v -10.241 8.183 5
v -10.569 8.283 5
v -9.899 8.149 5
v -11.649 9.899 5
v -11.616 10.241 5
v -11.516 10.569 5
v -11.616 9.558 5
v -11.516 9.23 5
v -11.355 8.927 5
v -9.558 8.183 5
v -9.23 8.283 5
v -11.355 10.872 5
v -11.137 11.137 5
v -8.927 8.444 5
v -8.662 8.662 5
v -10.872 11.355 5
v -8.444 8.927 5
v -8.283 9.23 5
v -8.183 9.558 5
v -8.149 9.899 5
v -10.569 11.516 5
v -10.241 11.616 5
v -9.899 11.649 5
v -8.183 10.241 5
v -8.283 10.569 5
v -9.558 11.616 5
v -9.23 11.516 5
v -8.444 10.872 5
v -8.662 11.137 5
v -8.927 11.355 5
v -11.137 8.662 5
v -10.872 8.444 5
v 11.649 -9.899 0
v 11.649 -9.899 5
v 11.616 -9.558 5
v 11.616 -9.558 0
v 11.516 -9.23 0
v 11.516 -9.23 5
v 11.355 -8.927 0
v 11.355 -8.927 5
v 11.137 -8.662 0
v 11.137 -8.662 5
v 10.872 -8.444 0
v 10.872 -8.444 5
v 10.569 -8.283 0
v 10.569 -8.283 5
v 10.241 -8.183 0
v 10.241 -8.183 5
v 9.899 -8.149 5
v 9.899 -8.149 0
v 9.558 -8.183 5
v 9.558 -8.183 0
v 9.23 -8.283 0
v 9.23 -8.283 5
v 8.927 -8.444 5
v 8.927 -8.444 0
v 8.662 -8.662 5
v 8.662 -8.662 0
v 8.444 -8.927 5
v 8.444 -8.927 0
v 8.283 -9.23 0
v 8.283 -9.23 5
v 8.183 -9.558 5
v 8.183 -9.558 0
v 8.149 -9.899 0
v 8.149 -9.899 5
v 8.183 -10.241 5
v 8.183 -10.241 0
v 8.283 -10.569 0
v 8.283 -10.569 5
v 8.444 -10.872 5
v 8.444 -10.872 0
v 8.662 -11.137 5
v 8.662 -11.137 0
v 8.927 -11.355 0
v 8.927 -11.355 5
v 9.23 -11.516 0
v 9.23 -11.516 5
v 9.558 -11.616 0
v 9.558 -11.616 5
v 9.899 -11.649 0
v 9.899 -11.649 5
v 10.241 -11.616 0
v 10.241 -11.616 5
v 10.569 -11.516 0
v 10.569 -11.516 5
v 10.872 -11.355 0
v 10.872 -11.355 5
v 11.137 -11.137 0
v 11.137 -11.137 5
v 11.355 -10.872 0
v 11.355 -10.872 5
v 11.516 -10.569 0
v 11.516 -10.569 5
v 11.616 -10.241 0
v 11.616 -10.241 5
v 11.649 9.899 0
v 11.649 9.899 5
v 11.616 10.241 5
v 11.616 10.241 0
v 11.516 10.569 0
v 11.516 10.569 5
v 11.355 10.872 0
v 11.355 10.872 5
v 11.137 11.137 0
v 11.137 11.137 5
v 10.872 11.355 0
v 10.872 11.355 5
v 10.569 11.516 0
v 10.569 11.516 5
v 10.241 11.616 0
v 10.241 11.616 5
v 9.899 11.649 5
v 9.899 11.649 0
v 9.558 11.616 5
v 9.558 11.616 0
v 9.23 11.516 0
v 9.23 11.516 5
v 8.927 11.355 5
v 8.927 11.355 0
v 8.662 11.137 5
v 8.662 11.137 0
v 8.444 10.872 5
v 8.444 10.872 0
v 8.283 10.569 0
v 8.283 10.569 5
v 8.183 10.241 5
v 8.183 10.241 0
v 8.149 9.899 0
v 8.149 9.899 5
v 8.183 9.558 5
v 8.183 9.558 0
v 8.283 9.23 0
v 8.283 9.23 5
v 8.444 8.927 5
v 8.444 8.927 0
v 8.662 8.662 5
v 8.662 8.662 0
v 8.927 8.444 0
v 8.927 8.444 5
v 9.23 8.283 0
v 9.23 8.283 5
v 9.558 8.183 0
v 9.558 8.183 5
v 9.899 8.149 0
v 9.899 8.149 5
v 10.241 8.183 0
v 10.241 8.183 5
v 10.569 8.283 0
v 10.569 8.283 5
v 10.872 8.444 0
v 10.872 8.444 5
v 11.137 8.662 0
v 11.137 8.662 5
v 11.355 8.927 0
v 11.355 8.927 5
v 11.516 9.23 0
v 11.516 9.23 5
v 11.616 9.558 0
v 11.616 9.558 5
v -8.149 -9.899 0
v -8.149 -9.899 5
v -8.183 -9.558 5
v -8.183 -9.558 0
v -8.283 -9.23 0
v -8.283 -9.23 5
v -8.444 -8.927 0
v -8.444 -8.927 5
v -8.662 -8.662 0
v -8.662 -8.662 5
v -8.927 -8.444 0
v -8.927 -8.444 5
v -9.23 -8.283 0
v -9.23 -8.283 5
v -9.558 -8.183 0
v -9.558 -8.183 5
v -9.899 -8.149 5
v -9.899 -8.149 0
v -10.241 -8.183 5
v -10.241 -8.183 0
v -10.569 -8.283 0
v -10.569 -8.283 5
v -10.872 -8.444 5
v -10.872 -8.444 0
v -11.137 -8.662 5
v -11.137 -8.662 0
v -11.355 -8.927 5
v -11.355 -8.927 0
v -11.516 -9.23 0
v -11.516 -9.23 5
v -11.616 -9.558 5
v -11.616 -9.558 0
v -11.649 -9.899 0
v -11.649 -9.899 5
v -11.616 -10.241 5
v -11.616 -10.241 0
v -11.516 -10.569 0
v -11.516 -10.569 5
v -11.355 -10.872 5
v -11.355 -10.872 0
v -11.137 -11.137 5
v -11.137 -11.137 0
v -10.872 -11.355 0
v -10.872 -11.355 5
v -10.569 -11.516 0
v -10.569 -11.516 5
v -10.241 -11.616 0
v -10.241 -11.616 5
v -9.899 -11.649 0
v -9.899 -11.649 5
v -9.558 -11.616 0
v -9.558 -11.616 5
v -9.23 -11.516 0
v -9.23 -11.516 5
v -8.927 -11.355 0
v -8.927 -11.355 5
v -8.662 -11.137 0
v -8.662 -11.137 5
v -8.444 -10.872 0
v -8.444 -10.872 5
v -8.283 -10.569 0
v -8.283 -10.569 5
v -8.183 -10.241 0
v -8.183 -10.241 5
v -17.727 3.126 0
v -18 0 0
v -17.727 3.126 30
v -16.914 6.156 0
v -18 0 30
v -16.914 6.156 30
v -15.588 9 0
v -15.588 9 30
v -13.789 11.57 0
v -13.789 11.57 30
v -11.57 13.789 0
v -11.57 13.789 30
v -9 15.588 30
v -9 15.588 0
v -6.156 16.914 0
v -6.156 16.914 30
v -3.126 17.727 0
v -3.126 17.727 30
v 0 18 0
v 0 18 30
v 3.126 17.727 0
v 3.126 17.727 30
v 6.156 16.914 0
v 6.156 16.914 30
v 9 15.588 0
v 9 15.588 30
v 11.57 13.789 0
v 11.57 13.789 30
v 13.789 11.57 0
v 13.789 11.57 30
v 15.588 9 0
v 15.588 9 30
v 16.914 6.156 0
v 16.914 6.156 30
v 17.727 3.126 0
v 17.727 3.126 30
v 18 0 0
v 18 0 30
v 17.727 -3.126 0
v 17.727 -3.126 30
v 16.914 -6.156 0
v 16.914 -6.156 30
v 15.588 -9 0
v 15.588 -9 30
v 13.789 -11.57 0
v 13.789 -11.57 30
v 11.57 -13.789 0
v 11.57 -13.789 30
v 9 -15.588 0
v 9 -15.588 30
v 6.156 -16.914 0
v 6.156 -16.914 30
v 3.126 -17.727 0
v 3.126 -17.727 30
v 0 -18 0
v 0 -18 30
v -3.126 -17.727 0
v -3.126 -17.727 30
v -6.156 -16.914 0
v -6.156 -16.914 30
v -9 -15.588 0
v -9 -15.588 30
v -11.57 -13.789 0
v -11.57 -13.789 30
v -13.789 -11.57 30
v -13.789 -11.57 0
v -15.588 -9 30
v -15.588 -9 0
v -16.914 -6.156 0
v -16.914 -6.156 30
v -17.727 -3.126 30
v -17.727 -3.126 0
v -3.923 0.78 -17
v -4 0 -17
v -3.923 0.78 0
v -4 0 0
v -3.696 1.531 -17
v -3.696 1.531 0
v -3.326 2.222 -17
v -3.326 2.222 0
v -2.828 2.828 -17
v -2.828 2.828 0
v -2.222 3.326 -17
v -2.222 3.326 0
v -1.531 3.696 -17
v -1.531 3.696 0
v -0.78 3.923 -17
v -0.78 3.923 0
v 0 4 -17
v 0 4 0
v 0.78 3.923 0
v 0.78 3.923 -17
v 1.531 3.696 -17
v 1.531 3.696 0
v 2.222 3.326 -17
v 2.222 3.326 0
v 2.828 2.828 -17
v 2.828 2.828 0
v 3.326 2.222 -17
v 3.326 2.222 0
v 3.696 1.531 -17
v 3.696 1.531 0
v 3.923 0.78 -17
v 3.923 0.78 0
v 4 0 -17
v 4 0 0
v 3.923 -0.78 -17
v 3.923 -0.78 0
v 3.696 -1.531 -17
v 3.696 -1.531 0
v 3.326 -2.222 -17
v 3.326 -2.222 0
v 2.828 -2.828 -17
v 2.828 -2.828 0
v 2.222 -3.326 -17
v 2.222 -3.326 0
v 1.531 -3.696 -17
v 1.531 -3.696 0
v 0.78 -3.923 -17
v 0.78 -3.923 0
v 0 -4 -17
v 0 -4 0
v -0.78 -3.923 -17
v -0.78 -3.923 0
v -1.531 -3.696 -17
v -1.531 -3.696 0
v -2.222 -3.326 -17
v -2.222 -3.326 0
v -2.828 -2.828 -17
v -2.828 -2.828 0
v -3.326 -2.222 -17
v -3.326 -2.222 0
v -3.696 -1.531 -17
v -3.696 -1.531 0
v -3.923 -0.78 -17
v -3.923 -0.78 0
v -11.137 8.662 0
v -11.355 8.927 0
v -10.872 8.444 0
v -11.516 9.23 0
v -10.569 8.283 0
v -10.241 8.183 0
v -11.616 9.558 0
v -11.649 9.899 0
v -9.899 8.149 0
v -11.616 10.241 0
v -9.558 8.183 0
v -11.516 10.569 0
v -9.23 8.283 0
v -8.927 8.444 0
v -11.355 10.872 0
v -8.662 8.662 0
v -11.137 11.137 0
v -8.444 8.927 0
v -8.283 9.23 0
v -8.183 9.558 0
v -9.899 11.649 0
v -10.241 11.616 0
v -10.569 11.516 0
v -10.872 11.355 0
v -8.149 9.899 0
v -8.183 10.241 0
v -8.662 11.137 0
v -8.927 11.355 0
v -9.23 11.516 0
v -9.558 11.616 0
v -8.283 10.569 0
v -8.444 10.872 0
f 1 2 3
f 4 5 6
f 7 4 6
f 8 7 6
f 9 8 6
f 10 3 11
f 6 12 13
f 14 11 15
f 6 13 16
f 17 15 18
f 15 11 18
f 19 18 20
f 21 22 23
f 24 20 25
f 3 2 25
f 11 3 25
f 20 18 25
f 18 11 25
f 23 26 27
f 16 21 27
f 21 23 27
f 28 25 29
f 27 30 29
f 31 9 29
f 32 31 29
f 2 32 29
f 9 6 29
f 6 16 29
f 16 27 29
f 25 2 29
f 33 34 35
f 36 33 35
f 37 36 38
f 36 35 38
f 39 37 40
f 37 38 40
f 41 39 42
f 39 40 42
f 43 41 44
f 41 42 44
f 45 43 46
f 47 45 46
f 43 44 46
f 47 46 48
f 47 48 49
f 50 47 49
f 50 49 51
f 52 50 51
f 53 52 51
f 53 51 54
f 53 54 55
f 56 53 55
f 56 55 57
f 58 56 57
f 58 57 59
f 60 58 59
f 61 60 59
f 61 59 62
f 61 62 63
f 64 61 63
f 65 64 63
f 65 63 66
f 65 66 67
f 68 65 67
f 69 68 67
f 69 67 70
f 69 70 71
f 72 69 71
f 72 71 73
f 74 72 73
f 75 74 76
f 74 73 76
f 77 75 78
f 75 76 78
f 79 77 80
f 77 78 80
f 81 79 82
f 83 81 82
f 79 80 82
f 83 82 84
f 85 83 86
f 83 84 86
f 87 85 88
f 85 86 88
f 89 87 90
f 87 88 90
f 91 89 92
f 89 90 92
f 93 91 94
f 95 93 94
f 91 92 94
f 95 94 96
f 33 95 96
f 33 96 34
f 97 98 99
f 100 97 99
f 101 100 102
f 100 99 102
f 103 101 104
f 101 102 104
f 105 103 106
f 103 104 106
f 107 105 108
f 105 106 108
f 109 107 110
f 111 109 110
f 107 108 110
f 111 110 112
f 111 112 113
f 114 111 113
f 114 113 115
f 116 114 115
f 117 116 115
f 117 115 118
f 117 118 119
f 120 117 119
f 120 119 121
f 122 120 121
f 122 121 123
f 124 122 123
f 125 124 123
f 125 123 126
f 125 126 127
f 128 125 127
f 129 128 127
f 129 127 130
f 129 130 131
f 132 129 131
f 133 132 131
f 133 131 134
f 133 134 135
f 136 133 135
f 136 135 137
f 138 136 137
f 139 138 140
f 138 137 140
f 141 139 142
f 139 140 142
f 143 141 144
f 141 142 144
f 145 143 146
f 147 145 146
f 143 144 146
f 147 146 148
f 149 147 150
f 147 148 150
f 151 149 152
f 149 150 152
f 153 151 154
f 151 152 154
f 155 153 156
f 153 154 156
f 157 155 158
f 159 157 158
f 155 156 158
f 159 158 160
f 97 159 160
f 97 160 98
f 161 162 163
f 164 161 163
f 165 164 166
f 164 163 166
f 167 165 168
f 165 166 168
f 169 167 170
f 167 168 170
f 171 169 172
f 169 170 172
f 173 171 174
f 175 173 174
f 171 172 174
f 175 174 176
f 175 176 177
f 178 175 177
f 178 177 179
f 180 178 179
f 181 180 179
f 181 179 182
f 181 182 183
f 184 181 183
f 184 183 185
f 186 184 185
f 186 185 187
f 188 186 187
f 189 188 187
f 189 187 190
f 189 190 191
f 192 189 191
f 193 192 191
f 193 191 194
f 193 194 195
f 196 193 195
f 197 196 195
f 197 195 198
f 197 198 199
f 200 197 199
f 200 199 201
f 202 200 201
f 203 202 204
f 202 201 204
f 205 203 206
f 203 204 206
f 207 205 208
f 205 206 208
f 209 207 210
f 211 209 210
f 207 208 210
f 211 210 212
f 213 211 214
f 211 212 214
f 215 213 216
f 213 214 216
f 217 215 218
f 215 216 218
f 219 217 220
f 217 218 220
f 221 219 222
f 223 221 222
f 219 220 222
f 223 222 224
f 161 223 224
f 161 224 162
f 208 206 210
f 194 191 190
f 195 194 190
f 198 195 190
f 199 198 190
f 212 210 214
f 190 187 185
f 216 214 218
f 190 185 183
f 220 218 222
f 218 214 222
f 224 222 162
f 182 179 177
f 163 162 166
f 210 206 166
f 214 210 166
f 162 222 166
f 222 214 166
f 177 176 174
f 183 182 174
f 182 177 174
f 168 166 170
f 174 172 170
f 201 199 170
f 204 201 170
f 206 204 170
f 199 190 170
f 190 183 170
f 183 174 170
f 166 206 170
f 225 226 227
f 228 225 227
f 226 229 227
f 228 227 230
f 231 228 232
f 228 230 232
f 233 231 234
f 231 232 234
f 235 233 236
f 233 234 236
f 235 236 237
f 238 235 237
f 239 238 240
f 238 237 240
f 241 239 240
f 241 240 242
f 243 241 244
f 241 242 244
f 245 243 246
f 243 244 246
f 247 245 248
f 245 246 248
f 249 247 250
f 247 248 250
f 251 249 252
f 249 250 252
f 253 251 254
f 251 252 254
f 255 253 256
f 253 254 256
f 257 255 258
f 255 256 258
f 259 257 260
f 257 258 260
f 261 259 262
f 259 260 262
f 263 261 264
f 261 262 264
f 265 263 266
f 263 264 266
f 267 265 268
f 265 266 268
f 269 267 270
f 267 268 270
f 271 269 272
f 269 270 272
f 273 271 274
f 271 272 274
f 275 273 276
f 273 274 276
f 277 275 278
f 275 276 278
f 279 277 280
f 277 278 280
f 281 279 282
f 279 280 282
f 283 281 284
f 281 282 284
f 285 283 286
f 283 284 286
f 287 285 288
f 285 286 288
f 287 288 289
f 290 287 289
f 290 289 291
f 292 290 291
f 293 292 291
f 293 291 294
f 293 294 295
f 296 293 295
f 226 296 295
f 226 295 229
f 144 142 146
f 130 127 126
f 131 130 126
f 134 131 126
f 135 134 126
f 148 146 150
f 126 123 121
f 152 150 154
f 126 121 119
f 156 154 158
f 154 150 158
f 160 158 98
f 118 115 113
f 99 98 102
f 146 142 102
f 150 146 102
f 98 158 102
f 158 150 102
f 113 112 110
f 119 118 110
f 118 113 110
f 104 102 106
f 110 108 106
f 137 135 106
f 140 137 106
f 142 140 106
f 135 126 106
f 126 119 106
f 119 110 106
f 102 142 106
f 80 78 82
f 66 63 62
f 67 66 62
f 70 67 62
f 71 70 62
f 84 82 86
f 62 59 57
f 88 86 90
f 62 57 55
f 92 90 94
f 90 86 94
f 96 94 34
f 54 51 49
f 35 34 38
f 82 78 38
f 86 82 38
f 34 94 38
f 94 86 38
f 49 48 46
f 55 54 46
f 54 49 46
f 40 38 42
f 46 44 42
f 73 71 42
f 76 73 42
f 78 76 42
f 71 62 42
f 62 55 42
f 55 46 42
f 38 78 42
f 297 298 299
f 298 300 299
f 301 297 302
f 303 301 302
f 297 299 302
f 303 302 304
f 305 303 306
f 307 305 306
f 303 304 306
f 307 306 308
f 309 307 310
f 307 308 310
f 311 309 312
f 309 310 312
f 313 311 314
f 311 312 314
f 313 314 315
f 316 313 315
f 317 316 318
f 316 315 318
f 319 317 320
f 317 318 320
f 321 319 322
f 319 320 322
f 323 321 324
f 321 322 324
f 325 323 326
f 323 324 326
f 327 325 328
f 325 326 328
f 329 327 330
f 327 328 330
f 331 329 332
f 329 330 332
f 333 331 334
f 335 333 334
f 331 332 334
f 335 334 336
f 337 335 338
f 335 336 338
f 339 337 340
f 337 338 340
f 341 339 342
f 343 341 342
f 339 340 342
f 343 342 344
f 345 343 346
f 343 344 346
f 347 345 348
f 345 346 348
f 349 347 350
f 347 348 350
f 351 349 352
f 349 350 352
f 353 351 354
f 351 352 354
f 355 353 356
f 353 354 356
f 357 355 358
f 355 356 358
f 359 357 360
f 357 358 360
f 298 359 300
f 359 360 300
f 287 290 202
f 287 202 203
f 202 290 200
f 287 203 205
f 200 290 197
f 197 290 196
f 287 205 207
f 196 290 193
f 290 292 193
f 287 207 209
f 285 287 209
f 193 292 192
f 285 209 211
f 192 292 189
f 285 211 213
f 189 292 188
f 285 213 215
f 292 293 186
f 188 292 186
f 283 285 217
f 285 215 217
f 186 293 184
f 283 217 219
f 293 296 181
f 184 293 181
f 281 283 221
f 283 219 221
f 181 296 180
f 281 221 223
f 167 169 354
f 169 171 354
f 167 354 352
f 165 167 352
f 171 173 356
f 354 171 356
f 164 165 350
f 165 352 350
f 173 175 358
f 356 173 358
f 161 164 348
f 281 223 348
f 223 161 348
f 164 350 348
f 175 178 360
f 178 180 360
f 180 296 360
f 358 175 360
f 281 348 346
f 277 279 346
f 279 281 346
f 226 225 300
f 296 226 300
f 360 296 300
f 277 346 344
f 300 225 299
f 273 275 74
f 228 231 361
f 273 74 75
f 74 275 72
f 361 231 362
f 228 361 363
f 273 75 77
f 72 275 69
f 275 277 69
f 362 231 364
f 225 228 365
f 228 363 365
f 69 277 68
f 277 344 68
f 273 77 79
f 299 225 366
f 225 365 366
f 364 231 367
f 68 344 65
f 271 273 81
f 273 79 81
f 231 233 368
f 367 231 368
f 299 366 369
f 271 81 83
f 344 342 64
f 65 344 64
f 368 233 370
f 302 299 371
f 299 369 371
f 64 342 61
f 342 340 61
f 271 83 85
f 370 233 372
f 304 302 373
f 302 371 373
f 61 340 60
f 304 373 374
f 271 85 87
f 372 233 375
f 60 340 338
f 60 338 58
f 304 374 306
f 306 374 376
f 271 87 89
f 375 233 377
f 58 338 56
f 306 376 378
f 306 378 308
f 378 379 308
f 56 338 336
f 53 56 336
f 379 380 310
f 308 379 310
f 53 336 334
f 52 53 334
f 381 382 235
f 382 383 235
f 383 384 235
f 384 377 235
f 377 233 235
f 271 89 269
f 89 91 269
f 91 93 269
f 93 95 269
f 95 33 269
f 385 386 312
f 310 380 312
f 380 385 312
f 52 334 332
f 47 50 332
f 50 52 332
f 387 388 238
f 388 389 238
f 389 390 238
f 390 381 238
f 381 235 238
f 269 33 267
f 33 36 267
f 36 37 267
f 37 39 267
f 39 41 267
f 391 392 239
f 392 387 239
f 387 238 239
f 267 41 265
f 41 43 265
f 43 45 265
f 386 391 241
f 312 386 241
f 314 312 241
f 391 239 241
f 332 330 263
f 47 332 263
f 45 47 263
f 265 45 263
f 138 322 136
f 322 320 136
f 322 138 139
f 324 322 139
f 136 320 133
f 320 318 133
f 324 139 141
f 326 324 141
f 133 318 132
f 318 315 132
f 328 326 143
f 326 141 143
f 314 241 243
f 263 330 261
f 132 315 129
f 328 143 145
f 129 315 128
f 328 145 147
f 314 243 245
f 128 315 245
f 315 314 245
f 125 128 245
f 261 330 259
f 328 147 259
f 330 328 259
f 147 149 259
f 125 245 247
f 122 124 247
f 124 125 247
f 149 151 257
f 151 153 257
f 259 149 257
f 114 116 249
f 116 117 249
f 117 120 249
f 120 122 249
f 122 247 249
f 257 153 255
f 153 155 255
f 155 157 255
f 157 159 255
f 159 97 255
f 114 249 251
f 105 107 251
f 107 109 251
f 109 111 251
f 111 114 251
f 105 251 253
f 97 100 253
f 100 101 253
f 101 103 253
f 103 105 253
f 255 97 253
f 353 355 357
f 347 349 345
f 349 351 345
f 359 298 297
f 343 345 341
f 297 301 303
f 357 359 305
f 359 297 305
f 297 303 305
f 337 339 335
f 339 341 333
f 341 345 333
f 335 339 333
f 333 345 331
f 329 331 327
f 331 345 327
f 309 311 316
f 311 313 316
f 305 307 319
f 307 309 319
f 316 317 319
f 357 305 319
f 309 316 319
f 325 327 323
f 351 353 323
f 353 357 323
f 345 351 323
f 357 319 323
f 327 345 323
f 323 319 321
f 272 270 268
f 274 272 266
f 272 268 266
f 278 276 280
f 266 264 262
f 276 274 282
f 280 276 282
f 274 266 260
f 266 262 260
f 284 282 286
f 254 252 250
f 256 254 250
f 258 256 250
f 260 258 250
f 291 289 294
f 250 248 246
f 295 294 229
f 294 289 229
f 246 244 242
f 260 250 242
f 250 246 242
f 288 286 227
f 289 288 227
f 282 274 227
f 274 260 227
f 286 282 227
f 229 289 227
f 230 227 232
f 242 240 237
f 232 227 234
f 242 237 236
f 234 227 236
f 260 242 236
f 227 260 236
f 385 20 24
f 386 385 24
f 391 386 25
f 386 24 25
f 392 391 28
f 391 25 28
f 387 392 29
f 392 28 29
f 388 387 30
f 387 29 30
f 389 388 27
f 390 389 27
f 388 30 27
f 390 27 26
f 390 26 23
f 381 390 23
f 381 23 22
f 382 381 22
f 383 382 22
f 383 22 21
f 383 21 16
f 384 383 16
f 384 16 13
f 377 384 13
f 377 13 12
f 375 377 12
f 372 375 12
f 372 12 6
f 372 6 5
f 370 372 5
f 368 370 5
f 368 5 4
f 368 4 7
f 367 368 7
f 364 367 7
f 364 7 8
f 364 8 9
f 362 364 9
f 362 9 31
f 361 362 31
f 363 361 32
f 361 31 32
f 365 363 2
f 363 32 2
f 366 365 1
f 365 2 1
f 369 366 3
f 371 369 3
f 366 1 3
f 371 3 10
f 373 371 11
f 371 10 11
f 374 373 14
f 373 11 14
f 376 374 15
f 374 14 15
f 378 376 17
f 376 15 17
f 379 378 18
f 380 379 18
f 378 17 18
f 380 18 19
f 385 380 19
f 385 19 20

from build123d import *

# Parameters (mm, degrees)
F_3_5_3_5_DIAMETER_HOLE1_D     = 3.5
F_3_5_3_5_DIAMETER_HOLE1_DEPTH = 5


with BuildPart() as part:
    # Sketch2 → Revolve1 (revolve)
    with BuildSketch(Plane.XZ, mode=Mode.PRIVATE) as revolve1_sk:
        Polygon((18, 30), (0, 30), (0, -17), (4, -17), (4, 0), (18, 0), align=None)
    revolve(revolve1_sk.sketch.rotate(Axis((0, 0, 30), (0, 0, -1)), 180), axis=Axis((0, 0, 30), (0, 0, -1)))

    # Ø3.5 (3.5) Diameter Hole1
    with Locations(Plane(origin=(0, 0, 0), x_dir=(-1, 0, 0), z_dir=(0, 0, -1))):
        with Locations((9.899494937, 9.899494937), (-9.899494937, -9.899494937), (9.899494937, -9.899494937), (-9.899494937, 9.899494937)):
            Hole(F_3_5_3_5_DIAMETER_HOLE1_D / 2, depth=F_3_5_3_5_DIAMETER_HOLE1_DEPTH)


solid = part.part
